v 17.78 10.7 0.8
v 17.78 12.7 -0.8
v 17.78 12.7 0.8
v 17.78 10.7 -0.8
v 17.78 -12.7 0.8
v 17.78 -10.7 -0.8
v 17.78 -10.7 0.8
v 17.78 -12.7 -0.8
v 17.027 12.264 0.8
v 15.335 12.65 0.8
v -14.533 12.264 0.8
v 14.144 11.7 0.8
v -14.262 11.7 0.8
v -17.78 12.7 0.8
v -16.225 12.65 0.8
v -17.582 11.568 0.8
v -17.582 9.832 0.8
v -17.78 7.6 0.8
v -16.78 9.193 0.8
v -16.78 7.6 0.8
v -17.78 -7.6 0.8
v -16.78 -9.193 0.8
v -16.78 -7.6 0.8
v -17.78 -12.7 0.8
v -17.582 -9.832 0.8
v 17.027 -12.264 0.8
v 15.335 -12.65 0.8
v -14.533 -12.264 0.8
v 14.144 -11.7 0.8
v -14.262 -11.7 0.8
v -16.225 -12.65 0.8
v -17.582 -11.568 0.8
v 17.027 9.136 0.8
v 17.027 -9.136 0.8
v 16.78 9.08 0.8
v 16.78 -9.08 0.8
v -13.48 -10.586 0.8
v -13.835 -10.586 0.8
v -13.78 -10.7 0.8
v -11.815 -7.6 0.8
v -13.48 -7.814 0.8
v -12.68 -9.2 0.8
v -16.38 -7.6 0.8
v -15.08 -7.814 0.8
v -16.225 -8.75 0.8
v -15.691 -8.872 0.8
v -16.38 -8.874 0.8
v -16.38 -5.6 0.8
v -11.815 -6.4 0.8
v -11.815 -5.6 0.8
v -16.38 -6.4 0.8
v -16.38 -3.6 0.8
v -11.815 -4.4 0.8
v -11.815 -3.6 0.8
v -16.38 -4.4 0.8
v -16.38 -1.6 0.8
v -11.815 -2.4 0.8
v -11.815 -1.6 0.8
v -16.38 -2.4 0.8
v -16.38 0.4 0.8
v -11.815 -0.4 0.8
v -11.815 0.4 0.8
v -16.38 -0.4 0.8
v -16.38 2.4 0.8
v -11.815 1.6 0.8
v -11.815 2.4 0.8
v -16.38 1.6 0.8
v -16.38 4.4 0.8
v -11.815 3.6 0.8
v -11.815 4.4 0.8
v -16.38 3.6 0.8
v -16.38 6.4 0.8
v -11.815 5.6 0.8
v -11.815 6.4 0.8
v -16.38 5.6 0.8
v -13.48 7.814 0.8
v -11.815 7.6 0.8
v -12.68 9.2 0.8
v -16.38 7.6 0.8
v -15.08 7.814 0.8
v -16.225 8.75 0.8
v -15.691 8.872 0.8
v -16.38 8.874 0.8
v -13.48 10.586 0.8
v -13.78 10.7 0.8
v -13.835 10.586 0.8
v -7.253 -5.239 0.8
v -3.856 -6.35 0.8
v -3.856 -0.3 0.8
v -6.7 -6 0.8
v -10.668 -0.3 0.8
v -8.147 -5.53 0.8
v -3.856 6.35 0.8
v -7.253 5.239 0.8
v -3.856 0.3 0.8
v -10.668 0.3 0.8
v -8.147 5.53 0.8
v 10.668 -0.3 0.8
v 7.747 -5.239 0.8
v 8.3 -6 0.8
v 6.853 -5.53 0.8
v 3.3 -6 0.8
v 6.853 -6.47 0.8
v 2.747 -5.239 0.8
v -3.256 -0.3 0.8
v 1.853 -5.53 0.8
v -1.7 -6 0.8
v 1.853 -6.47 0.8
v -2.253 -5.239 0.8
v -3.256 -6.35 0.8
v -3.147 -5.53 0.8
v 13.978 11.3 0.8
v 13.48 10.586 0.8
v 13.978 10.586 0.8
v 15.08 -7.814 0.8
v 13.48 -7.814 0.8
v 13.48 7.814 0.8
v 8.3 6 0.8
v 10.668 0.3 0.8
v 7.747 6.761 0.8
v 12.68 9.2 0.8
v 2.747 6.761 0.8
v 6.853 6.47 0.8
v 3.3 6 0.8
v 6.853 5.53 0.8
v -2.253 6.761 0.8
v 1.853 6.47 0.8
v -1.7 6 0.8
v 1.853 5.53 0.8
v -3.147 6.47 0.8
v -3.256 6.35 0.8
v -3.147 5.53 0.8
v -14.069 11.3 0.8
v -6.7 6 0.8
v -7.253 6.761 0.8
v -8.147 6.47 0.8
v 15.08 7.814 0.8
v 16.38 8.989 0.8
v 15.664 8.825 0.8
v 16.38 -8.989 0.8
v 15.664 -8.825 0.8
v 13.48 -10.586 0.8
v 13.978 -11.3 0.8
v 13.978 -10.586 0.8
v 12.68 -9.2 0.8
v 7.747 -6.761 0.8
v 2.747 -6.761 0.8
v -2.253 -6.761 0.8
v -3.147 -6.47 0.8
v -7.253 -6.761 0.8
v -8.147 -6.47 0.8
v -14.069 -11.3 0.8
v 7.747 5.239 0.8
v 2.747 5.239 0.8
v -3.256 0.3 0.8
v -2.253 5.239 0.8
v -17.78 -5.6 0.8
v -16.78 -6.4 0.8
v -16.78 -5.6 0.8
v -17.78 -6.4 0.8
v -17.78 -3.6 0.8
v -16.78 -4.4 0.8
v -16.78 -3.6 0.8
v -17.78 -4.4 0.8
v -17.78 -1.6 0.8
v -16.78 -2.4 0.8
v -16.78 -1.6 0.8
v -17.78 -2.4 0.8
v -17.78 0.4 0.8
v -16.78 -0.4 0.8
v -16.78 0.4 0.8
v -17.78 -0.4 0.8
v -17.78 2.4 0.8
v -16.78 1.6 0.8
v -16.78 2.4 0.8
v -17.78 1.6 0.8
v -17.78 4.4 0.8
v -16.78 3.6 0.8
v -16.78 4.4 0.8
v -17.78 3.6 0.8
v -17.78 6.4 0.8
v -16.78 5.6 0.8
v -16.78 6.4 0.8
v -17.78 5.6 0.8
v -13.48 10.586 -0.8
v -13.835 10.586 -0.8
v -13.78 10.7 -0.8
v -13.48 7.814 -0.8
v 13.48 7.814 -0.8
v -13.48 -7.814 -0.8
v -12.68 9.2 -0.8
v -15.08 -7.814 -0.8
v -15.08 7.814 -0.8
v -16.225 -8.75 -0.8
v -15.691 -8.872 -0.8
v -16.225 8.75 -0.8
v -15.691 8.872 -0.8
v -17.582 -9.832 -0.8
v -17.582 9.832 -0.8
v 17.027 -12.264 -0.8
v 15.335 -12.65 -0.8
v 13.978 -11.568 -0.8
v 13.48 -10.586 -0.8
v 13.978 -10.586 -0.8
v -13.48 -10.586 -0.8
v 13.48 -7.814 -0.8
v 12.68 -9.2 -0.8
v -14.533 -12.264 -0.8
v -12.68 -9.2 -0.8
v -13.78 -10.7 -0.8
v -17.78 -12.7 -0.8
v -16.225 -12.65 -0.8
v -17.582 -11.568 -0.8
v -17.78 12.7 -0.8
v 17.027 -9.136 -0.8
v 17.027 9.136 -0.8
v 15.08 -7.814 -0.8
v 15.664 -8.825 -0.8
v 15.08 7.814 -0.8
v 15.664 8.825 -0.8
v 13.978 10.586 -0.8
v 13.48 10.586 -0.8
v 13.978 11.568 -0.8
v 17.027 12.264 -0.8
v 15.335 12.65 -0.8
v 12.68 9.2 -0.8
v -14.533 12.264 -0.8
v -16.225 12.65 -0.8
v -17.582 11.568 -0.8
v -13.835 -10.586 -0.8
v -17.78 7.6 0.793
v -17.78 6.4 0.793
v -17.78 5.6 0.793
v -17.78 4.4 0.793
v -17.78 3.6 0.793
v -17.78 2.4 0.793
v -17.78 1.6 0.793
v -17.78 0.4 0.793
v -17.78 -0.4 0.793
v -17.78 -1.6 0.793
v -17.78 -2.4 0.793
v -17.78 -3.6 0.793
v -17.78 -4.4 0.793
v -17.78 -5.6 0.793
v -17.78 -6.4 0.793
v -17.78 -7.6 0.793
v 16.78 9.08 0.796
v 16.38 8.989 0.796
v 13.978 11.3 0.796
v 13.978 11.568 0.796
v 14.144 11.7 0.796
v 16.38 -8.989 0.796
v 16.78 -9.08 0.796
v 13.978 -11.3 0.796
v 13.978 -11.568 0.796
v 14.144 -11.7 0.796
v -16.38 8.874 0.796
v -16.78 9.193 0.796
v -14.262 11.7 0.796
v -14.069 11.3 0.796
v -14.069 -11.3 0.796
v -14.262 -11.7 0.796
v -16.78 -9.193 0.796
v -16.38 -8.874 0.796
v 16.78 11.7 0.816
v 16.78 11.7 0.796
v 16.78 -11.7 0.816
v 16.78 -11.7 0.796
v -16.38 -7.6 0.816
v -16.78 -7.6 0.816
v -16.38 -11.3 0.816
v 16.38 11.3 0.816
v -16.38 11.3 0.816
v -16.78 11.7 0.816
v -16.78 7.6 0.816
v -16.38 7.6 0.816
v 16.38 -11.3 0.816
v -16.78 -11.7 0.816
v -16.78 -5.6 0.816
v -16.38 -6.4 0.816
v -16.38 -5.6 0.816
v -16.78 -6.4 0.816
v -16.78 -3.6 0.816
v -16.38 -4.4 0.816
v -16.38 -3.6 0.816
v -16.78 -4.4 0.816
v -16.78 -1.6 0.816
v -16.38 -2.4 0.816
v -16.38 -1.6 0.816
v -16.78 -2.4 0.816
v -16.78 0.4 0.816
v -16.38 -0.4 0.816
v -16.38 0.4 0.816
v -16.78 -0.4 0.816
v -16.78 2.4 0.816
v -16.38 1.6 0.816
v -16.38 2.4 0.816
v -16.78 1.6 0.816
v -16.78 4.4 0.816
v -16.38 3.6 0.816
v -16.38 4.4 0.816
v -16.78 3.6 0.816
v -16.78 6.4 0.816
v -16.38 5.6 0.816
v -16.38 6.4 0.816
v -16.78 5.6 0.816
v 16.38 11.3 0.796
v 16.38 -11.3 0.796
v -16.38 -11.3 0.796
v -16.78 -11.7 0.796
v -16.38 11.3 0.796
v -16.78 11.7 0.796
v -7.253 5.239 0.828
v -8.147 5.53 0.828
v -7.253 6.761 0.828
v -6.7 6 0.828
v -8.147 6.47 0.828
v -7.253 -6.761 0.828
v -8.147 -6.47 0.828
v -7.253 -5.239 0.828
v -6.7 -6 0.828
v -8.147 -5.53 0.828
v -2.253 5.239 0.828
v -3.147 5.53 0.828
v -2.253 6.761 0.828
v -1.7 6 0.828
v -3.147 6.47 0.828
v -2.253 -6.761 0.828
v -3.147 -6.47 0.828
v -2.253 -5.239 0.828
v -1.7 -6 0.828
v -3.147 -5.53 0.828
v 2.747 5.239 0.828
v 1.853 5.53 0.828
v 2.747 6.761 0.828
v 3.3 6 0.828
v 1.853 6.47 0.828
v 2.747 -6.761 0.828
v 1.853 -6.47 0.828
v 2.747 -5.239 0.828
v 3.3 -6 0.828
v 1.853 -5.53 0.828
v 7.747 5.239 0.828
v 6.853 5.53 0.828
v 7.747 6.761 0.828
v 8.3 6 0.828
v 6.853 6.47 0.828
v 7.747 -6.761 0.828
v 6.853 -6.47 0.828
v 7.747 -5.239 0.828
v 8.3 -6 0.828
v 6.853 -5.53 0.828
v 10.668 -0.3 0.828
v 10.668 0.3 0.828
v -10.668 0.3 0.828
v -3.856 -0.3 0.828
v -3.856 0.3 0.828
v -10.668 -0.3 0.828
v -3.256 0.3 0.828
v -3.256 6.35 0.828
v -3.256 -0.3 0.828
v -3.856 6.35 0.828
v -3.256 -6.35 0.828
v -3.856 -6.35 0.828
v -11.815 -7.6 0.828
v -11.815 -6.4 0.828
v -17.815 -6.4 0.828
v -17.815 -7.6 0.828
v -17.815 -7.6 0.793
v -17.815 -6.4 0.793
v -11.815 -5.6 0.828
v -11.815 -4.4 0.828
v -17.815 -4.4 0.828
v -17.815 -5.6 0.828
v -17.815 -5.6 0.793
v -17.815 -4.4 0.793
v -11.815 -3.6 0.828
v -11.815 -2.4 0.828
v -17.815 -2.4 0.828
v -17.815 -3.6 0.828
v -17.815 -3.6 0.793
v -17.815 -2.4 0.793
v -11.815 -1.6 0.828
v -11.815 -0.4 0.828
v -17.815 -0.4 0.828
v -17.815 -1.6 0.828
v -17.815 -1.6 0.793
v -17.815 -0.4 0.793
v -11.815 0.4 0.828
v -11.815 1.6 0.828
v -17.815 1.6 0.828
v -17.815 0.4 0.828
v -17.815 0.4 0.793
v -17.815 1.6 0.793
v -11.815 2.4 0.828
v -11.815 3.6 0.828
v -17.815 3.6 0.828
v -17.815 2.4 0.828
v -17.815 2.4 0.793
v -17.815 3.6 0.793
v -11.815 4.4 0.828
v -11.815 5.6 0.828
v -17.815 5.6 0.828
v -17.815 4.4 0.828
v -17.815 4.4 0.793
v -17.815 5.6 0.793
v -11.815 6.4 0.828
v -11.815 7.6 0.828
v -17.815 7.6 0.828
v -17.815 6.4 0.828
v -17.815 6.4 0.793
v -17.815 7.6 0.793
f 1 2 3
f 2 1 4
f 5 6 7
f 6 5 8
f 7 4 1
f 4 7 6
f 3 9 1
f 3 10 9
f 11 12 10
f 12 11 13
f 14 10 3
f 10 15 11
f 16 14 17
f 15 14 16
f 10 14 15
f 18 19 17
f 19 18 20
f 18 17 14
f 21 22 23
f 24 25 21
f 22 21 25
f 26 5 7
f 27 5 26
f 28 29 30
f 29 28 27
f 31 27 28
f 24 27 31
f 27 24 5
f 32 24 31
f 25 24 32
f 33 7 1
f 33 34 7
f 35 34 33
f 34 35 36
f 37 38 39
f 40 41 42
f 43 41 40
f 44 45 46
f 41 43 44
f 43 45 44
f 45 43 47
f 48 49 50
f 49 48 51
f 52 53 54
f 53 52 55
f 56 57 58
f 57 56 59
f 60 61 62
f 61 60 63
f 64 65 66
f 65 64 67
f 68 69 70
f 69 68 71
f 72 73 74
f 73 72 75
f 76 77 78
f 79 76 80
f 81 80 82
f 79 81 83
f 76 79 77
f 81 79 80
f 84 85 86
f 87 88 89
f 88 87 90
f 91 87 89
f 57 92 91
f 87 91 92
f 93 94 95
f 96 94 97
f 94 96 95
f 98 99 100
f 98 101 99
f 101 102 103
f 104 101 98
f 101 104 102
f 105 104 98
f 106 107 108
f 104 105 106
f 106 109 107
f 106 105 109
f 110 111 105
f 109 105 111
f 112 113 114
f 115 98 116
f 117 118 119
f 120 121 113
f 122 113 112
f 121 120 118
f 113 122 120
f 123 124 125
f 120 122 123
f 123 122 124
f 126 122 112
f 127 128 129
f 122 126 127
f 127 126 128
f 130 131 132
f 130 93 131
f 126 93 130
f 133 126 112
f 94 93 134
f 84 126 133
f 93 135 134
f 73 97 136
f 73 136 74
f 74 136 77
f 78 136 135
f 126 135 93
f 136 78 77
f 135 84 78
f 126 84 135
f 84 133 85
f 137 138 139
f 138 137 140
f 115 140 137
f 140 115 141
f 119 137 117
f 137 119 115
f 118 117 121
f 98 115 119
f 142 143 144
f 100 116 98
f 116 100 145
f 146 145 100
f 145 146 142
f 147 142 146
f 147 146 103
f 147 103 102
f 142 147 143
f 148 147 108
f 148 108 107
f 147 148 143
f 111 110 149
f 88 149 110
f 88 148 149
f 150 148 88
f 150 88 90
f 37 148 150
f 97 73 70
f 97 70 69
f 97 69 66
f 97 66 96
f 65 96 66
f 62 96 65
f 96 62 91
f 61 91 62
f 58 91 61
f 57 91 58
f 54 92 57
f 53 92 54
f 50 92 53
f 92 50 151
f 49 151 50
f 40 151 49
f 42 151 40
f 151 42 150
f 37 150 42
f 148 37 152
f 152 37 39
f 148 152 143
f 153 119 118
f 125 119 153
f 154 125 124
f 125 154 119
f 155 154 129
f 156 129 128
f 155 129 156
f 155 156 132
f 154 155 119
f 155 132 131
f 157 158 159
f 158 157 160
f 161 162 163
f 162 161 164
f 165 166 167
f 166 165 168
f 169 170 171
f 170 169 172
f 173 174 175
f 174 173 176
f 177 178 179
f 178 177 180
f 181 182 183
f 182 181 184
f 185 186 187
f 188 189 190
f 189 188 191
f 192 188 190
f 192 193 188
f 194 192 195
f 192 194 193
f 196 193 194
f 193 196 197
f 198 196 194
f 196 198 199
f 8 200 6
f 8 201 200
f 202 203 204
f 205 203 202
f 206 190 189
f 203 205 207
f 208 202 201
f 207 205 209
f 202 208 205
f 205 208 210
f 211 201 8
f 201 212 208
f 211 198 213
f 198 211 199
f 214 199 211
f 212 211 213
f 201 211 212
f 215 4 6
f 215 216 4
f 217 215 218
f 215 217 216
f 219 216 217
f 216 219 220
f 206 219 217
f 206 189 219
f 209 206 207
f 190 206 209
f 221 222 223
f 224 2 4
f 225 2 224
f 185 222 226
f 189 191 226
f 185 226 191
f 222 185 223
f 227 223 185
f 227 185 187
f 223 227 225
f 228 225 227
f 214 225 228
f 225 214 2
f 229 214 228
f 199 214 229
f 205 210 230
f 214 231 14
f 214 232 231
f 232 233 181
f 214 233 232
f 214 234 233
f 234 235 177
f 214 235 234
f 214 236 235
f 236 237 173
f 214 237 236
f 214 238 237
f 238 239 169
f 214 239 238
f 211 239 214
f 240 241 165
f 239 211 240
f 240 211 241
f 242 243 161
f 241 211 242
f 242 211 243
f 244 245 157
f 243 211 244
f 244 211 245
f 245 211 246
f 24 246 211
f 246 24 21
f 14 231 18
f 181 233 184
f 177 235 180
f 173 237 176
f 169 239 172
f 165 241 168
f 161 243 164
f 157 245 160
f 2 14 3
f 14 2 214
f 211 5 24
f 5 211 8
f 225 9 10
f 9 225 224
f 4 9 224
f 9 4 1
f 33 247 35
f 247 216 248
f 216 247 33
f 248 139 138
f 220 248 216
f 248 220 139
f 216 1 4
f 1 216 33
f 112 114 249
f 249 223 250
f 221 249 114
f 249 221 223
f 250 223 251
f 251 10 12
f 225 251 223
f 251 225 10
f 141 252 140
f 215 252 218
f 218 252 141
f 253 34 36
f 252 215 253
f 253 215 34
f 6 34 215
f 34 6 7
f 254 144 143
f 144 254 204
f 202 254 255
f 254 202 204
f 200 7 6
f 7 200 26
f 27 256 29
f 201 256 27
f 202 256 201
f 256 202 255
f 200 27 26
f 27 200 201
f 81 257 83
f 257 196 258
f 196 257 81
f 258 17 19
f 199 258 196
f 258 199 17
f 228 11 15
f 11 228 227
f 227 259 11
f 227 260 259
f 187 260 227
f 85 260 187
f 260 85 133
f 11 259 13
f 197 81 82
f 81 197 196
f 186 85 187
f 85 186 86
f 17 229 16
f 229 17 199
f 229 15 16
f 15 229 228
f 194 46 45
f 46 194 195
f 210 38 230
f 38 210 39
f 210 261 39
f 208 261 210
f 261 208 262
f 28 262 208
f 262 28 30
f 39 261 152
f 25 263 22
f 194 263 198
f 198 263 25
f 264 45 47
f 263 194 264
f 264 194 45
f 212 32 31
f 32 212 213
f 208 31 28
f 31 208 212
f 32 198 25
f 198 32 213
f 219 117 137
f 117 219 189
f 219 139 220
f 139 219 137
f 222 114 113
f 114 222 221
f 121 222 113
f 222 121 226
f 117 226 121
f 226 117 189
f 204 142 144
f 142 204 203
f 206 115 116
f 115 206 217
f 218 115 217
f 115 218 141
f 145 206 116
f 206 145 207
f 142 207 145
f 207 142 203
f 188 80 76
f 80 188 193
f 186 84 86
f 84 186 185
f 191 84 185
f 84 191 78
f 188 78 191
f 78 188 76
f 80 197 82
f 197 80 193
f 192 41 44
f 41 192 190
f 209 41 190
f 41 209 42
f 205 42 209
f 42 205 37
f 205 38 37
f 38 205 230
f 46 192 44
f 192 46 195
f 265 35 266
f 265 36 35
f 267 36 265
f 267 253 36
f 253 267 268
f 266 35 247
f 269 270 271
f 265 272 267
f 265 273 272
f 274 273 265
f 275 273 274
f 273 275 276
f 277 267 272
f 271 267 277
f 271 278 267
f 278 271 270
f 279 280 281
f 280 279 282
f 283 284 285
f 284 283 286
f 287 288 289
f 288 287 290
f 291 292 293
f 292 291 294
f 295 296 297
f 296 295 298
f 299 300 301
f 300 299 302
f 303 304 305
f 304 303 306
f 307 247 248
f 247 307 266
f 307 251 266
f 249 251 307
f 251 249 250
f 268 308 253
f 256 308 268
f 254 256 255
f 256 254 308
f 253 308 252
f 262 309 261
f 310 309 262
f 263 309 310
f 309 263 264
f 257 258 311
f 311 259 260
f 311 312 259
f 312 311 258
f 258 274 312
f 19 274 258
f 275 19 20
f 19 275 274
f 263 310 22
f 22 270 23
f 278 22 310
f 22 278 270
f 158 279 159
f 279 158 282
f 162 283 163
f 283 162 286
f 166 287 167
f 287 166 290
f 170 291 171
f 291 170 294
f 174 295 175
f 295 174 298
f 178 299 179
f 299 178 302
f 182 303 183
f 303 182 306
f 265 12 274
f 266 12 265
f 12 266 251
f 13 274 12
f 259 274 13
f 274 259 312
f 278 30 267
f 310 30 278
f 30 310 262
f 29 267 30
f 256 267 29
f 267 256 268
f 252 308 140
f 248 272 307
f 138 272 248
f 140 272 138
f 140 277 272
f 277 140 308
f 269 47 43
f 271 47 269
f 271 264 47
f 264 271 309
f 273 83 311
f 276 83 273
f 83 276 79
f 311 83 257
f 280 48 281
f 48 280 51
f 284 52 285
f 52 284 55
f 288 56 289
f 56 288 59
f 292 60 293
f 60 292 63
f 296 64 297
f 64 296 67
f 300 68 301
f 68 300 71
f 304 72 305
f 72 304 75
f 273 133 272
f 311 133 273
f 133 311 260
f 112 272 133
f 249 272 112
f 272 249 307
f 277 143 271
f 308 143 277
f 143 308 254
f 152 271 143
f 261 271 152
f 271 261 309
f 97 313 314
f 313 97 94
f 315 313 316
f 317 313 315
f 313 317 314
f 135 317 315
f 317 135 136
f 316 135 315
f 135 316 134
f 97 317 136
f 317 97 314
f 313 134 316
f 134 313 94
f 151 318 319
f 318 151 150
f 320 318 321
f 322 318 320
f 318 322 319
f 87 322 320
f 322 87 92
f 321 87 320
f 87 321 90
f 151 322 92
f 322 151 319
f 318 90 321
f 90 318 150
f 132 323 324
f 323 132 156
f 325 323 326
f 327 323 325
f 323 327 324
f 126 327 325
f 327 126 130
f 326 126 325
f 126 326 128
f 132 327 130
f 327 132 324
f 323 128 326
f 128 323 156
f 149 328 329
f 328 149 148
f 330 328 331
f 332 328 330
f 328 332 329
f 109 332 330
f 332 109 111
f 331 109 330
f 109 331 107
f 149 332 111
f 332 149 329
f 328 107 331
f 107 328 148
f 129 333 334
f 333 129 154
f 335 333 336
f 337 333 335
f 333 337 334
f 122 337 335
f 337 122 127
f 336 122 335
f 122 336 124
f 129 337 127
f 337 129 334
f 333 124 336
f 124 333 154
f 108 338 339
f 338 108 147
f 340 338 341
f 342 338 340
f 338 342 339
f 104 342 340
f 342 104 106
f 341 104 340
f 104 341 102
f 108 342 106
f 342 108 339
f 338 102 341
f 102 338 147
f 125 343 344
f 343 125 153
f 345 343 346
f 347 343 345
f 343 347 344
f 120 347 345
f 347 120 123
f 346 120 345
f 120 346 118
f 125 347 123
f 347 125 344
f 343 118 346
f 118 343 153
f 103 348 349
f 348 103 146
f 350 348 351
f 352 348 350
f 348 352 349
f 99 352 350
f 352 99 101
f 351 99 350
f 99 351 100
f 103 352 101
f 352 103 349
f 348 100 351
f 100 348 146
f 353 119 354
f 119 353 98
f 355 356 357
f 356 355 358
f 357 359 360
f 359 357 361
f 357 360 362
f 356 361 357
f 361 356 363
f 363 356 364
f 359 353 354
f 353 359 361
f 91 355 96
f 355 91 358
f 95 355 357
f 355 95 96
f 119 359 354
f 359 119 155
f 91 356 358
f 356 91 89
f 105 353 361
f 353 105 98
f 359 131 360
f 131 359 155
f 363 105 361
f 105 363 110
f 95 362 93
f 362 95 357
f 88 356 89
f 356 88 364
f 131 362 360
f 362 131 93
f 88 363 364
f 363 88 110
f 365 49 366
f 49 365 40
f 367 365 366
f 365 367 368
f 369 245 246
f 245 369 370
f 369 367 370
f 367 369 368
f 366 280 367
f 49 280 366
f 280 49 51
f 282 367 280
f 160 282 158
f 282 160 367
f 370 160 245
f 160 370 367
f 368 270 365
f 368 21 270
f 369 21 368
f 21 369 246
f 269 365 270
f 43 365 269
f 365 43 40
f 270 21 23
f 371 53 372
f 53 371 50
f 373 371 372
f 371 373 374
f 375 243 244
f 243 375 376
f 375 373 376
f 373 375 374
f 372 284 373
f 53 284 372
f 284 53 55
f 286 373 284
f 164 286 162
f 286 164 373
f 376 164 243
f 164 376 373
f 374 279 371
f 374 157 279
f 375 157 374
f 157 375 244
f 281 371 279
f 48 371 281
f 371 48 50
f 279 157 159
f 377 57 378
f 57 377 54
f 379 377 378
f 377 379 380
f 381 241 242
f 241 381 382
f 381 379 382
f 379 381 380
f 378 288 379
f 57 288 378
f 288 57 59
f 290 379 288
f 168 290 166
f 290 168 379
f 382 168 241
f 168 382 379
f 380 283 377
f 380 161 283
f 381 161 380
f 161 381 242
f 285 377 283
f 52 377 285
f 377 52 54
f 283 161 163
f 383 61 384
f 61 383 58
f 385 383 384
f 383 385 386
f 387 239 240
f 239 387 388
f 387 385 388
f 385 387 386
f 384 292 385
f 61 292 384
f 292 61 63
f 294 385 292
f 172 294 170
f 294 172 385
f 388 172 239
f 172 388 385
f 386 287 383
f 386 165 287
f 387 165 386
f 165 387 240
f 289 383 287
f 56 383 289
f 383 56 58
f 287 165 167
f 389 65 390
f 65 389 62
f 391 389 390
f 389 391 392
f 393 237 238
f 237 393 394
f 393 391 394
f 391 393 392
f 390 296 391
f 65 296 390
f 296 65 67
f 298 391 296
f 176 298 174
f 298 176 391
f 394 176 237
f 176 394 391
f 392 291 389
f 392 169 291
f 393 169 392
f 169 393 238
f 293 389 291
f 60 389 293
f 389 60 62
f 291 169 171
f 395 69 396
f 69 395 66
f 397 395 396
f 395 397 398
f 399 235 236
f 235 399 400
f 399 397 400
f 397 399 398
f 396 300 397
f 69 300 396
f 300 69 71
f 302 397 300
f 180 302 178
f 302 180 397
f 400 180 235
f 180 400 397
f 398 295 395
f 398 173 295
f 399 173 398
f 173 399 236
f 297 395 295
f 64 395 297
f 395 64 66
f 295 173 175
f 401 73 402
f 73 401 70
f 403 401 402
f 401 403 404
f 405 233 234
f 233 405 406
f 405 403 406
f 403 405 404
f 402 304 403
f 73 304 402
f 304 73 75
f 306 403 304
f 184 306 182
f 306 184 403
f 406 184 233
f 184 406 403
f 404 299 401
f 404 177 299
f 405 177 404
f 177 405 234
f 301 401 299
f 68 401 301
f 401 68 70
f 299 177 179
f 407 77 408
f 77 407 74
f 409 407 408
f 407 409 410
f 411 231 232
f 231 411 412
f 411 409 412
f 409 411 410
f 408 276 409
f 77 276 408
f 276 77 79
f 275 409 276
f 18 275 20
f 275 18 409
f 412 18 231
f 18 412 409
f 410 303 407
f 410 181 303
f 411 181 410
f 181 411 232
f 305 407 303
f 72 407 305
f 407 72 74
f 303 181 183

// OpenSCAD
// Parameters
pcb_length = 35.56; //[17.78:71.12:0.01]
pcb_width = 25.4; //[12.7:50.8:0.01]
pcb_thickness = 1.6; //[0.8:3.2:0.1]
corner_radius = 2.0; //[0.5:5.0:0.1]
mount_hole_diameter = 3.2; //[2.0:5.0:0.1]
mount_hole_edge_offset = 3.5; //[2.0:7.0:0.1]
copper_thickness = 0.035; //[0.01:0.1:0.005]
silkscreen_thickness = 0.02; //[0.01:0.1:0.005]
edge_finger_length = 6.0; //[3.0:12.0:0.1]
edge_finger_width = 1.2; //[0.6:2.5:0.1]
edge_finger_count = 8; //[2:20:1]
edge_finger_pitch = 2.0; //[1.0:3.5:0.1]
edge_finger_edge_margin = 3.0; //[1.0:6.0:0.1]
trace_width = 0.6; //[0.2:2.0:0.1]
pad_diameter = 1.6; //[0.8:3.5:0.1]
pad_count = 4; //[1:12:1]
pad_row_y = 6.0; //[2.0:10.0:0.1]
pad_pitch_x = 5.0; //[2.0:10.0:0.1]
silk_border_inset = 1.0; //[0.5:3.0:0.1]
silk_border_width = 0.4; //[0.2:1.0:0.05]

// PCB Body with Rounded Corners
module pcb_body() {
  difference() {
    color([0.0, 0.4, 0.2]) // PCB color
    cube([pcb_length, pcb_width, pcb_thickness], center=true);
    translate([pcb_length/2 - corner_radius, pcb_width/2 - corner_radius, 0])
      cylinder(r=corner_radius, h=pcb_thickness*2, center=true);
    translate([pcb_length/2 - corner_radius, -pcb_width/2 + corner_radius, 0])
      cylinder(r=corner_radius, h=pcb_thickness*2, center=true);
    translate([-pcb_length/2 + corner_radius, pcb_width/2 - corner_radius, 0])
      cylinder(r=corner_radius, h=pcb_thickness*2, center=true);
    translate([-pcb_length/2 + corner_radius, -pcb_width/2 + corner_radius, 0])
      cylinder(r=corner_radius, h=pcb_thickness*2, center=true);
  }
}

// Mounting Holes
module mounting_holes() {
  difference() {
    pcb_body();
    translate([pcb_length/2 - mount_hole_edge_offset, pcb_width/2 - mount_hole_edge_offset, 0])
      cylinder(r=mount_hole_diameter/2, h=pcb_thickness*3, center=true);
    translate([pcb_length/2 - mount_hole_edge_offset, -pcb_width/2 + mount_hole_edge_offset, 0])
      cylinder(r=mount_hole_diameter/2, h=pcb_thickness*3, center=true);
    translate([-pcb_length/2 + mount_hole_edge_offset, pcb_width/2 - mount_hole_edge_offset, 0])
      cylinder(r=mount_hole_diameter/2, h=pcb_thickness*3, center=true);
    translate([-pcb_length/2 + mount_hole_edge_offset, -pcb_width/2 + mount_hole_edge_offset, 0])
      cylinder(r=mount_hole_diameter/2, h=pcb_thickness*3, center=true);
  }
}

// Silkscreen Markings
module silkscreen_markings() {
  difference() {
    color([1, 1, 1]) // Silkscreen color
    translate([0, 0, pcb_thickness/2 + silkscreen_thickness/2 - silkscreen_thickness*0.2])
      cube([pcb_length - 2*silk_border_inset, pcb_width - 2*silk_border_inset, silkscreen_thickness], center=true);
    translate([0, 0, pcb_thickness/2 + silkscreen_thickness/2 - silkscreen_thickness*0.2])
      cube([pcb_length - 2*(silk_border_inset + silk_border_width), pcb_width - 2*(silk_border_inset + silk_border_width), silkscreen_thickness*3], center=true);
  }
}

// Copper Pads and Traces
module copper_pads_traces() {
  union() {
    color([0.72, 0.45, 0.2]) // Copper color
    translate([0, 0, pcb_thickness/2 + copper_thickness/2 - copper_thickness*0.2])
      cube([pcb_length*0.6, trace_width, copper_thickness], center=true);
    translate([-pcb_length*0.1, 0, pcb_thickness/2 + copper_thickness/2 - copper_thickness*0.2])
      cube([trace_width, pcb_width*0.5, copper_thickness], center=true);
    for (i = [0:pad_count-1]) {
      translate([-(pad_count-1)*pad_pitch_x/2 + i*pad_pitch_x, pad_row_y, pcb_thickness/2 + copper_thickness/2 - copper_thickness*0.2])
        cylinder(r=pad_diameter/2, h=copper_thickness, center=true);
      translate([-(pad_count-1)*pad_pitch_x/2 + i*pad_pitch_x, -pad_row_y, pcb_thickness/2 + copper_thickness/2 - copper_thickness*0.2])
        cylinder(r=pad_diameter/2, h=copper_thickness, center=true);
    }
  }
}

// Edge Connector Fingers
module edge_connector_fingers() {
  union() {
    color([0.72, 0.45, 0.2]) // Copper color
    for (i = [0:edge_finger_count-1]) {
      translate([-pcb_length/2 + edge_finger_length/2 - copper_thickness, -(edge_finger_count-1)*edge_finger_pitch/2 + i*edge_finger_pitch, pcb_thickness/2 + copper_thickness/2 - copper_thickness*0.2])
        cube([edge_finger_length, edge_finger_width, copper_thickness], center=true);
    }
  }
}

// Complete PCB Model
module pcb_complete() {
  union() {
    mounting_holes();
    silkscreen_markings();
    copper_pads_traces();
    edge_connector_fingers();
  }
}

// Render the complete PCB
pcb_complete();
